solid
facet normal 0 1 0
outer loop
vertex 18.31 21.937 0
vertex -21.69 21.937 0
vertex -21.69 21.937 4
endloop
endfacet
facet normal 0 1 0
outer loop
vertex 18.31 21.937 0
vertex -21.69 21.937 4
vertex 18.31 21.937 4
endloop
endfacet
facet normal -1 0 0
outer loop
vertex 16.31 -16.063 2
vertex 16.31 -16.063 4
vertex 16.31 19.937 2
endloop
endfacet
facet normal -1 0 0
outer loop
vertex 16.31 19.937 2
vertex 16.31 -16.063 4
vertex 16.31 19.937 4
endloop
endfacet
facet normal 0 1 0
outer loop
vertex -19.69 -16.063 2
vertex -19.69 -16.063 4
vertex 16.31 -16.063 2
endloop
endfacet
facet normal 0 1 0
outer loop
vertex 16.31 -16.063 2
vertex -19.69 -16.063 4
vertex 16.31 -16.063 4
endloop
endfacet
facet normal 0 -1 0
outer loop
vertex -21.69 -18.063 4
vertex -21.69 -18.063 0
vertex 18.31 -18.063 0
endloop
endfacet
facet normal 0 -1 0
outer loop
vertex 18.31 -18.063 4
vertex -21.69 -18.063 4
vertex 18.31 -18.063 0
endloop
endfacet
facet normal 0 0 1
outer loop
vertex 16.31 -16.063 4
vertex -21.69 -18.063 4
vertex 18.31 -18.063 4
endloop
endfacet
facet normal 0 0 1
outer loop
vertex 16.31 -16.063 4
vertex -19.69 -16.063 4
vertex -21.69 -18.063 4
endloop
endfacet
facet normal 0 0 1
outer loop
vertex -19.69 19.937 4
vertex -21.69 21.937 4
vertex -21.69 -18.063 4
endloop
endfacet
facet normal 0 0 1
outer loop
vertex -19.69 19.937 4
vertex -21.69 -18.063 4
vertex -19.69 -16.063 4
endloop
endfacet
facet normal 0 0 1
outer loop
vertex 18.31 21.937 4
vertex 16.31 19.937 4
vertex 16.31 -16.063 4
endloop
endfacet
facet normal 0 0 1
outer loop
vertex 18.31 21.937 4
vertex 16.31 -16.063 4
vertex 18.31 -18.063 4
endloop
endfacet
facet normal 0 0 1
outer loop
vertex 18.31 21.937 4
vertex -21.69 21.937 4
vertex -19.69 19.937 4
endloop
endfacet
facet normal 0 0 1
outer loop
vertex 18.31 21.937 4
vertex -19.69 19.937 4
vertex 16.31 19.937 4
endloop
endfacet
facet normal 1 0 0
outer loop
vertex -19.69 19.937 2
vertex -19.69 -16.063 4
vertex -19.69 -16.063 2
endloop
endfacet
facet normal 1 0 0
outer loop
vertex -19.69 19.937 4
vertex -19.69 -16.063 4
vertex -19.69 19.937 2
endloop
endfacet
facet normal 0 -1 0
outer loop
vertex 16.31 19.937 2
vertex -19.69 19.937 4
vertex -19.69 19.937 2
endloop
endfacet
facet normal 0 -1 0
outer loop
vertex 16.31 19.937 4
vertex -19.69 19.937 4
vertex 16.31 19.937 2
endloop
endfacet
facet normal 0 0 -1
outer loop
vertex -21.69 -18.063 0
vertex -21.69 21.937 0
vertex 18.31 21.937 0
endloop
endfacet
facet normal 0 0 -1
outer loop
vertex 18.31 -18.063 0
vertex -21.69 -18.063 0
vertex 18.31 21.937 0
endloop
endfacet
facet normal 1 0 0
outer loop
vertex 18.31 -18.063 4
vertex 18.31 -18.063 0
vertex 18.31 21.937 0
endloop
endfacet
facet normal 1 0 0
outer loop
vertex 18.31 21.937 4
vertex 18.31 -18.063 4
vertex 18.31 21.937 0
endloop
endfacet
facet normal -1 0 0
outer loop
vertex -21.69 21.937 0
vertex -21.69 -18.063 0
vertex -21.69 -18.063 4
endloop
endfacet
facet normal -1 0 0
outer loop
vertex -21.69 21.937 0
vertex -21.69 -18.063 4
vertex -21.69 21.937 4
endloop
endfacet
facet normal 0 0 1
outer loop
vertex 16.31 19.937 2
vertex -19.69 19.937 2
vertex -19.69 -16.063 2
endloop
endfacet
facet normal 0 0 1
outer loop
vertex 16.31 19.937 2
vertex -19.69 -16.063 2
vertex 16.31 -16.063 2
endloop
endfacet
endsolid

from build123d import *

# Parameters (mm, degrees)
F0_W     = 40
F0_H     = 40
F1_DEPTH = 4
F2_W     = 36.000001
F2_H     = 36.000001
F3_DEPTH = 2
F4_W     = 36
F4_H     = 36
F5_DEPTH = 2


with BuildPart() as f1:
    # F0 (on Top) → F1 (new body)
    with BuildSketch(Plane.XY):
        with Locations((-1.689615, 1.937058)):
            Rectangle(F0_W, F0_H)
    extrude(amount=F1_DEPTH)

    # F2 (on face) → F3 (join)
    with BuildSketch(Plane.XY.offset(4)):
        with Locations((-1.689615, 1.937058)):
            Rectangle(F2_W, F2_H)
    extrude(amount=-F3_DEPTH)

    # F4 (on face) → F5 (cut)
    with BuildSketch(Plane.XY.offset(4)):
        with Locations((-1.689615, 1.937058)):
            Rectangle(F4_W, F4_H)
    extrude(amount=-F5_DEPTH, mode=Mode.SUBTRACT)


solid = f1.part
